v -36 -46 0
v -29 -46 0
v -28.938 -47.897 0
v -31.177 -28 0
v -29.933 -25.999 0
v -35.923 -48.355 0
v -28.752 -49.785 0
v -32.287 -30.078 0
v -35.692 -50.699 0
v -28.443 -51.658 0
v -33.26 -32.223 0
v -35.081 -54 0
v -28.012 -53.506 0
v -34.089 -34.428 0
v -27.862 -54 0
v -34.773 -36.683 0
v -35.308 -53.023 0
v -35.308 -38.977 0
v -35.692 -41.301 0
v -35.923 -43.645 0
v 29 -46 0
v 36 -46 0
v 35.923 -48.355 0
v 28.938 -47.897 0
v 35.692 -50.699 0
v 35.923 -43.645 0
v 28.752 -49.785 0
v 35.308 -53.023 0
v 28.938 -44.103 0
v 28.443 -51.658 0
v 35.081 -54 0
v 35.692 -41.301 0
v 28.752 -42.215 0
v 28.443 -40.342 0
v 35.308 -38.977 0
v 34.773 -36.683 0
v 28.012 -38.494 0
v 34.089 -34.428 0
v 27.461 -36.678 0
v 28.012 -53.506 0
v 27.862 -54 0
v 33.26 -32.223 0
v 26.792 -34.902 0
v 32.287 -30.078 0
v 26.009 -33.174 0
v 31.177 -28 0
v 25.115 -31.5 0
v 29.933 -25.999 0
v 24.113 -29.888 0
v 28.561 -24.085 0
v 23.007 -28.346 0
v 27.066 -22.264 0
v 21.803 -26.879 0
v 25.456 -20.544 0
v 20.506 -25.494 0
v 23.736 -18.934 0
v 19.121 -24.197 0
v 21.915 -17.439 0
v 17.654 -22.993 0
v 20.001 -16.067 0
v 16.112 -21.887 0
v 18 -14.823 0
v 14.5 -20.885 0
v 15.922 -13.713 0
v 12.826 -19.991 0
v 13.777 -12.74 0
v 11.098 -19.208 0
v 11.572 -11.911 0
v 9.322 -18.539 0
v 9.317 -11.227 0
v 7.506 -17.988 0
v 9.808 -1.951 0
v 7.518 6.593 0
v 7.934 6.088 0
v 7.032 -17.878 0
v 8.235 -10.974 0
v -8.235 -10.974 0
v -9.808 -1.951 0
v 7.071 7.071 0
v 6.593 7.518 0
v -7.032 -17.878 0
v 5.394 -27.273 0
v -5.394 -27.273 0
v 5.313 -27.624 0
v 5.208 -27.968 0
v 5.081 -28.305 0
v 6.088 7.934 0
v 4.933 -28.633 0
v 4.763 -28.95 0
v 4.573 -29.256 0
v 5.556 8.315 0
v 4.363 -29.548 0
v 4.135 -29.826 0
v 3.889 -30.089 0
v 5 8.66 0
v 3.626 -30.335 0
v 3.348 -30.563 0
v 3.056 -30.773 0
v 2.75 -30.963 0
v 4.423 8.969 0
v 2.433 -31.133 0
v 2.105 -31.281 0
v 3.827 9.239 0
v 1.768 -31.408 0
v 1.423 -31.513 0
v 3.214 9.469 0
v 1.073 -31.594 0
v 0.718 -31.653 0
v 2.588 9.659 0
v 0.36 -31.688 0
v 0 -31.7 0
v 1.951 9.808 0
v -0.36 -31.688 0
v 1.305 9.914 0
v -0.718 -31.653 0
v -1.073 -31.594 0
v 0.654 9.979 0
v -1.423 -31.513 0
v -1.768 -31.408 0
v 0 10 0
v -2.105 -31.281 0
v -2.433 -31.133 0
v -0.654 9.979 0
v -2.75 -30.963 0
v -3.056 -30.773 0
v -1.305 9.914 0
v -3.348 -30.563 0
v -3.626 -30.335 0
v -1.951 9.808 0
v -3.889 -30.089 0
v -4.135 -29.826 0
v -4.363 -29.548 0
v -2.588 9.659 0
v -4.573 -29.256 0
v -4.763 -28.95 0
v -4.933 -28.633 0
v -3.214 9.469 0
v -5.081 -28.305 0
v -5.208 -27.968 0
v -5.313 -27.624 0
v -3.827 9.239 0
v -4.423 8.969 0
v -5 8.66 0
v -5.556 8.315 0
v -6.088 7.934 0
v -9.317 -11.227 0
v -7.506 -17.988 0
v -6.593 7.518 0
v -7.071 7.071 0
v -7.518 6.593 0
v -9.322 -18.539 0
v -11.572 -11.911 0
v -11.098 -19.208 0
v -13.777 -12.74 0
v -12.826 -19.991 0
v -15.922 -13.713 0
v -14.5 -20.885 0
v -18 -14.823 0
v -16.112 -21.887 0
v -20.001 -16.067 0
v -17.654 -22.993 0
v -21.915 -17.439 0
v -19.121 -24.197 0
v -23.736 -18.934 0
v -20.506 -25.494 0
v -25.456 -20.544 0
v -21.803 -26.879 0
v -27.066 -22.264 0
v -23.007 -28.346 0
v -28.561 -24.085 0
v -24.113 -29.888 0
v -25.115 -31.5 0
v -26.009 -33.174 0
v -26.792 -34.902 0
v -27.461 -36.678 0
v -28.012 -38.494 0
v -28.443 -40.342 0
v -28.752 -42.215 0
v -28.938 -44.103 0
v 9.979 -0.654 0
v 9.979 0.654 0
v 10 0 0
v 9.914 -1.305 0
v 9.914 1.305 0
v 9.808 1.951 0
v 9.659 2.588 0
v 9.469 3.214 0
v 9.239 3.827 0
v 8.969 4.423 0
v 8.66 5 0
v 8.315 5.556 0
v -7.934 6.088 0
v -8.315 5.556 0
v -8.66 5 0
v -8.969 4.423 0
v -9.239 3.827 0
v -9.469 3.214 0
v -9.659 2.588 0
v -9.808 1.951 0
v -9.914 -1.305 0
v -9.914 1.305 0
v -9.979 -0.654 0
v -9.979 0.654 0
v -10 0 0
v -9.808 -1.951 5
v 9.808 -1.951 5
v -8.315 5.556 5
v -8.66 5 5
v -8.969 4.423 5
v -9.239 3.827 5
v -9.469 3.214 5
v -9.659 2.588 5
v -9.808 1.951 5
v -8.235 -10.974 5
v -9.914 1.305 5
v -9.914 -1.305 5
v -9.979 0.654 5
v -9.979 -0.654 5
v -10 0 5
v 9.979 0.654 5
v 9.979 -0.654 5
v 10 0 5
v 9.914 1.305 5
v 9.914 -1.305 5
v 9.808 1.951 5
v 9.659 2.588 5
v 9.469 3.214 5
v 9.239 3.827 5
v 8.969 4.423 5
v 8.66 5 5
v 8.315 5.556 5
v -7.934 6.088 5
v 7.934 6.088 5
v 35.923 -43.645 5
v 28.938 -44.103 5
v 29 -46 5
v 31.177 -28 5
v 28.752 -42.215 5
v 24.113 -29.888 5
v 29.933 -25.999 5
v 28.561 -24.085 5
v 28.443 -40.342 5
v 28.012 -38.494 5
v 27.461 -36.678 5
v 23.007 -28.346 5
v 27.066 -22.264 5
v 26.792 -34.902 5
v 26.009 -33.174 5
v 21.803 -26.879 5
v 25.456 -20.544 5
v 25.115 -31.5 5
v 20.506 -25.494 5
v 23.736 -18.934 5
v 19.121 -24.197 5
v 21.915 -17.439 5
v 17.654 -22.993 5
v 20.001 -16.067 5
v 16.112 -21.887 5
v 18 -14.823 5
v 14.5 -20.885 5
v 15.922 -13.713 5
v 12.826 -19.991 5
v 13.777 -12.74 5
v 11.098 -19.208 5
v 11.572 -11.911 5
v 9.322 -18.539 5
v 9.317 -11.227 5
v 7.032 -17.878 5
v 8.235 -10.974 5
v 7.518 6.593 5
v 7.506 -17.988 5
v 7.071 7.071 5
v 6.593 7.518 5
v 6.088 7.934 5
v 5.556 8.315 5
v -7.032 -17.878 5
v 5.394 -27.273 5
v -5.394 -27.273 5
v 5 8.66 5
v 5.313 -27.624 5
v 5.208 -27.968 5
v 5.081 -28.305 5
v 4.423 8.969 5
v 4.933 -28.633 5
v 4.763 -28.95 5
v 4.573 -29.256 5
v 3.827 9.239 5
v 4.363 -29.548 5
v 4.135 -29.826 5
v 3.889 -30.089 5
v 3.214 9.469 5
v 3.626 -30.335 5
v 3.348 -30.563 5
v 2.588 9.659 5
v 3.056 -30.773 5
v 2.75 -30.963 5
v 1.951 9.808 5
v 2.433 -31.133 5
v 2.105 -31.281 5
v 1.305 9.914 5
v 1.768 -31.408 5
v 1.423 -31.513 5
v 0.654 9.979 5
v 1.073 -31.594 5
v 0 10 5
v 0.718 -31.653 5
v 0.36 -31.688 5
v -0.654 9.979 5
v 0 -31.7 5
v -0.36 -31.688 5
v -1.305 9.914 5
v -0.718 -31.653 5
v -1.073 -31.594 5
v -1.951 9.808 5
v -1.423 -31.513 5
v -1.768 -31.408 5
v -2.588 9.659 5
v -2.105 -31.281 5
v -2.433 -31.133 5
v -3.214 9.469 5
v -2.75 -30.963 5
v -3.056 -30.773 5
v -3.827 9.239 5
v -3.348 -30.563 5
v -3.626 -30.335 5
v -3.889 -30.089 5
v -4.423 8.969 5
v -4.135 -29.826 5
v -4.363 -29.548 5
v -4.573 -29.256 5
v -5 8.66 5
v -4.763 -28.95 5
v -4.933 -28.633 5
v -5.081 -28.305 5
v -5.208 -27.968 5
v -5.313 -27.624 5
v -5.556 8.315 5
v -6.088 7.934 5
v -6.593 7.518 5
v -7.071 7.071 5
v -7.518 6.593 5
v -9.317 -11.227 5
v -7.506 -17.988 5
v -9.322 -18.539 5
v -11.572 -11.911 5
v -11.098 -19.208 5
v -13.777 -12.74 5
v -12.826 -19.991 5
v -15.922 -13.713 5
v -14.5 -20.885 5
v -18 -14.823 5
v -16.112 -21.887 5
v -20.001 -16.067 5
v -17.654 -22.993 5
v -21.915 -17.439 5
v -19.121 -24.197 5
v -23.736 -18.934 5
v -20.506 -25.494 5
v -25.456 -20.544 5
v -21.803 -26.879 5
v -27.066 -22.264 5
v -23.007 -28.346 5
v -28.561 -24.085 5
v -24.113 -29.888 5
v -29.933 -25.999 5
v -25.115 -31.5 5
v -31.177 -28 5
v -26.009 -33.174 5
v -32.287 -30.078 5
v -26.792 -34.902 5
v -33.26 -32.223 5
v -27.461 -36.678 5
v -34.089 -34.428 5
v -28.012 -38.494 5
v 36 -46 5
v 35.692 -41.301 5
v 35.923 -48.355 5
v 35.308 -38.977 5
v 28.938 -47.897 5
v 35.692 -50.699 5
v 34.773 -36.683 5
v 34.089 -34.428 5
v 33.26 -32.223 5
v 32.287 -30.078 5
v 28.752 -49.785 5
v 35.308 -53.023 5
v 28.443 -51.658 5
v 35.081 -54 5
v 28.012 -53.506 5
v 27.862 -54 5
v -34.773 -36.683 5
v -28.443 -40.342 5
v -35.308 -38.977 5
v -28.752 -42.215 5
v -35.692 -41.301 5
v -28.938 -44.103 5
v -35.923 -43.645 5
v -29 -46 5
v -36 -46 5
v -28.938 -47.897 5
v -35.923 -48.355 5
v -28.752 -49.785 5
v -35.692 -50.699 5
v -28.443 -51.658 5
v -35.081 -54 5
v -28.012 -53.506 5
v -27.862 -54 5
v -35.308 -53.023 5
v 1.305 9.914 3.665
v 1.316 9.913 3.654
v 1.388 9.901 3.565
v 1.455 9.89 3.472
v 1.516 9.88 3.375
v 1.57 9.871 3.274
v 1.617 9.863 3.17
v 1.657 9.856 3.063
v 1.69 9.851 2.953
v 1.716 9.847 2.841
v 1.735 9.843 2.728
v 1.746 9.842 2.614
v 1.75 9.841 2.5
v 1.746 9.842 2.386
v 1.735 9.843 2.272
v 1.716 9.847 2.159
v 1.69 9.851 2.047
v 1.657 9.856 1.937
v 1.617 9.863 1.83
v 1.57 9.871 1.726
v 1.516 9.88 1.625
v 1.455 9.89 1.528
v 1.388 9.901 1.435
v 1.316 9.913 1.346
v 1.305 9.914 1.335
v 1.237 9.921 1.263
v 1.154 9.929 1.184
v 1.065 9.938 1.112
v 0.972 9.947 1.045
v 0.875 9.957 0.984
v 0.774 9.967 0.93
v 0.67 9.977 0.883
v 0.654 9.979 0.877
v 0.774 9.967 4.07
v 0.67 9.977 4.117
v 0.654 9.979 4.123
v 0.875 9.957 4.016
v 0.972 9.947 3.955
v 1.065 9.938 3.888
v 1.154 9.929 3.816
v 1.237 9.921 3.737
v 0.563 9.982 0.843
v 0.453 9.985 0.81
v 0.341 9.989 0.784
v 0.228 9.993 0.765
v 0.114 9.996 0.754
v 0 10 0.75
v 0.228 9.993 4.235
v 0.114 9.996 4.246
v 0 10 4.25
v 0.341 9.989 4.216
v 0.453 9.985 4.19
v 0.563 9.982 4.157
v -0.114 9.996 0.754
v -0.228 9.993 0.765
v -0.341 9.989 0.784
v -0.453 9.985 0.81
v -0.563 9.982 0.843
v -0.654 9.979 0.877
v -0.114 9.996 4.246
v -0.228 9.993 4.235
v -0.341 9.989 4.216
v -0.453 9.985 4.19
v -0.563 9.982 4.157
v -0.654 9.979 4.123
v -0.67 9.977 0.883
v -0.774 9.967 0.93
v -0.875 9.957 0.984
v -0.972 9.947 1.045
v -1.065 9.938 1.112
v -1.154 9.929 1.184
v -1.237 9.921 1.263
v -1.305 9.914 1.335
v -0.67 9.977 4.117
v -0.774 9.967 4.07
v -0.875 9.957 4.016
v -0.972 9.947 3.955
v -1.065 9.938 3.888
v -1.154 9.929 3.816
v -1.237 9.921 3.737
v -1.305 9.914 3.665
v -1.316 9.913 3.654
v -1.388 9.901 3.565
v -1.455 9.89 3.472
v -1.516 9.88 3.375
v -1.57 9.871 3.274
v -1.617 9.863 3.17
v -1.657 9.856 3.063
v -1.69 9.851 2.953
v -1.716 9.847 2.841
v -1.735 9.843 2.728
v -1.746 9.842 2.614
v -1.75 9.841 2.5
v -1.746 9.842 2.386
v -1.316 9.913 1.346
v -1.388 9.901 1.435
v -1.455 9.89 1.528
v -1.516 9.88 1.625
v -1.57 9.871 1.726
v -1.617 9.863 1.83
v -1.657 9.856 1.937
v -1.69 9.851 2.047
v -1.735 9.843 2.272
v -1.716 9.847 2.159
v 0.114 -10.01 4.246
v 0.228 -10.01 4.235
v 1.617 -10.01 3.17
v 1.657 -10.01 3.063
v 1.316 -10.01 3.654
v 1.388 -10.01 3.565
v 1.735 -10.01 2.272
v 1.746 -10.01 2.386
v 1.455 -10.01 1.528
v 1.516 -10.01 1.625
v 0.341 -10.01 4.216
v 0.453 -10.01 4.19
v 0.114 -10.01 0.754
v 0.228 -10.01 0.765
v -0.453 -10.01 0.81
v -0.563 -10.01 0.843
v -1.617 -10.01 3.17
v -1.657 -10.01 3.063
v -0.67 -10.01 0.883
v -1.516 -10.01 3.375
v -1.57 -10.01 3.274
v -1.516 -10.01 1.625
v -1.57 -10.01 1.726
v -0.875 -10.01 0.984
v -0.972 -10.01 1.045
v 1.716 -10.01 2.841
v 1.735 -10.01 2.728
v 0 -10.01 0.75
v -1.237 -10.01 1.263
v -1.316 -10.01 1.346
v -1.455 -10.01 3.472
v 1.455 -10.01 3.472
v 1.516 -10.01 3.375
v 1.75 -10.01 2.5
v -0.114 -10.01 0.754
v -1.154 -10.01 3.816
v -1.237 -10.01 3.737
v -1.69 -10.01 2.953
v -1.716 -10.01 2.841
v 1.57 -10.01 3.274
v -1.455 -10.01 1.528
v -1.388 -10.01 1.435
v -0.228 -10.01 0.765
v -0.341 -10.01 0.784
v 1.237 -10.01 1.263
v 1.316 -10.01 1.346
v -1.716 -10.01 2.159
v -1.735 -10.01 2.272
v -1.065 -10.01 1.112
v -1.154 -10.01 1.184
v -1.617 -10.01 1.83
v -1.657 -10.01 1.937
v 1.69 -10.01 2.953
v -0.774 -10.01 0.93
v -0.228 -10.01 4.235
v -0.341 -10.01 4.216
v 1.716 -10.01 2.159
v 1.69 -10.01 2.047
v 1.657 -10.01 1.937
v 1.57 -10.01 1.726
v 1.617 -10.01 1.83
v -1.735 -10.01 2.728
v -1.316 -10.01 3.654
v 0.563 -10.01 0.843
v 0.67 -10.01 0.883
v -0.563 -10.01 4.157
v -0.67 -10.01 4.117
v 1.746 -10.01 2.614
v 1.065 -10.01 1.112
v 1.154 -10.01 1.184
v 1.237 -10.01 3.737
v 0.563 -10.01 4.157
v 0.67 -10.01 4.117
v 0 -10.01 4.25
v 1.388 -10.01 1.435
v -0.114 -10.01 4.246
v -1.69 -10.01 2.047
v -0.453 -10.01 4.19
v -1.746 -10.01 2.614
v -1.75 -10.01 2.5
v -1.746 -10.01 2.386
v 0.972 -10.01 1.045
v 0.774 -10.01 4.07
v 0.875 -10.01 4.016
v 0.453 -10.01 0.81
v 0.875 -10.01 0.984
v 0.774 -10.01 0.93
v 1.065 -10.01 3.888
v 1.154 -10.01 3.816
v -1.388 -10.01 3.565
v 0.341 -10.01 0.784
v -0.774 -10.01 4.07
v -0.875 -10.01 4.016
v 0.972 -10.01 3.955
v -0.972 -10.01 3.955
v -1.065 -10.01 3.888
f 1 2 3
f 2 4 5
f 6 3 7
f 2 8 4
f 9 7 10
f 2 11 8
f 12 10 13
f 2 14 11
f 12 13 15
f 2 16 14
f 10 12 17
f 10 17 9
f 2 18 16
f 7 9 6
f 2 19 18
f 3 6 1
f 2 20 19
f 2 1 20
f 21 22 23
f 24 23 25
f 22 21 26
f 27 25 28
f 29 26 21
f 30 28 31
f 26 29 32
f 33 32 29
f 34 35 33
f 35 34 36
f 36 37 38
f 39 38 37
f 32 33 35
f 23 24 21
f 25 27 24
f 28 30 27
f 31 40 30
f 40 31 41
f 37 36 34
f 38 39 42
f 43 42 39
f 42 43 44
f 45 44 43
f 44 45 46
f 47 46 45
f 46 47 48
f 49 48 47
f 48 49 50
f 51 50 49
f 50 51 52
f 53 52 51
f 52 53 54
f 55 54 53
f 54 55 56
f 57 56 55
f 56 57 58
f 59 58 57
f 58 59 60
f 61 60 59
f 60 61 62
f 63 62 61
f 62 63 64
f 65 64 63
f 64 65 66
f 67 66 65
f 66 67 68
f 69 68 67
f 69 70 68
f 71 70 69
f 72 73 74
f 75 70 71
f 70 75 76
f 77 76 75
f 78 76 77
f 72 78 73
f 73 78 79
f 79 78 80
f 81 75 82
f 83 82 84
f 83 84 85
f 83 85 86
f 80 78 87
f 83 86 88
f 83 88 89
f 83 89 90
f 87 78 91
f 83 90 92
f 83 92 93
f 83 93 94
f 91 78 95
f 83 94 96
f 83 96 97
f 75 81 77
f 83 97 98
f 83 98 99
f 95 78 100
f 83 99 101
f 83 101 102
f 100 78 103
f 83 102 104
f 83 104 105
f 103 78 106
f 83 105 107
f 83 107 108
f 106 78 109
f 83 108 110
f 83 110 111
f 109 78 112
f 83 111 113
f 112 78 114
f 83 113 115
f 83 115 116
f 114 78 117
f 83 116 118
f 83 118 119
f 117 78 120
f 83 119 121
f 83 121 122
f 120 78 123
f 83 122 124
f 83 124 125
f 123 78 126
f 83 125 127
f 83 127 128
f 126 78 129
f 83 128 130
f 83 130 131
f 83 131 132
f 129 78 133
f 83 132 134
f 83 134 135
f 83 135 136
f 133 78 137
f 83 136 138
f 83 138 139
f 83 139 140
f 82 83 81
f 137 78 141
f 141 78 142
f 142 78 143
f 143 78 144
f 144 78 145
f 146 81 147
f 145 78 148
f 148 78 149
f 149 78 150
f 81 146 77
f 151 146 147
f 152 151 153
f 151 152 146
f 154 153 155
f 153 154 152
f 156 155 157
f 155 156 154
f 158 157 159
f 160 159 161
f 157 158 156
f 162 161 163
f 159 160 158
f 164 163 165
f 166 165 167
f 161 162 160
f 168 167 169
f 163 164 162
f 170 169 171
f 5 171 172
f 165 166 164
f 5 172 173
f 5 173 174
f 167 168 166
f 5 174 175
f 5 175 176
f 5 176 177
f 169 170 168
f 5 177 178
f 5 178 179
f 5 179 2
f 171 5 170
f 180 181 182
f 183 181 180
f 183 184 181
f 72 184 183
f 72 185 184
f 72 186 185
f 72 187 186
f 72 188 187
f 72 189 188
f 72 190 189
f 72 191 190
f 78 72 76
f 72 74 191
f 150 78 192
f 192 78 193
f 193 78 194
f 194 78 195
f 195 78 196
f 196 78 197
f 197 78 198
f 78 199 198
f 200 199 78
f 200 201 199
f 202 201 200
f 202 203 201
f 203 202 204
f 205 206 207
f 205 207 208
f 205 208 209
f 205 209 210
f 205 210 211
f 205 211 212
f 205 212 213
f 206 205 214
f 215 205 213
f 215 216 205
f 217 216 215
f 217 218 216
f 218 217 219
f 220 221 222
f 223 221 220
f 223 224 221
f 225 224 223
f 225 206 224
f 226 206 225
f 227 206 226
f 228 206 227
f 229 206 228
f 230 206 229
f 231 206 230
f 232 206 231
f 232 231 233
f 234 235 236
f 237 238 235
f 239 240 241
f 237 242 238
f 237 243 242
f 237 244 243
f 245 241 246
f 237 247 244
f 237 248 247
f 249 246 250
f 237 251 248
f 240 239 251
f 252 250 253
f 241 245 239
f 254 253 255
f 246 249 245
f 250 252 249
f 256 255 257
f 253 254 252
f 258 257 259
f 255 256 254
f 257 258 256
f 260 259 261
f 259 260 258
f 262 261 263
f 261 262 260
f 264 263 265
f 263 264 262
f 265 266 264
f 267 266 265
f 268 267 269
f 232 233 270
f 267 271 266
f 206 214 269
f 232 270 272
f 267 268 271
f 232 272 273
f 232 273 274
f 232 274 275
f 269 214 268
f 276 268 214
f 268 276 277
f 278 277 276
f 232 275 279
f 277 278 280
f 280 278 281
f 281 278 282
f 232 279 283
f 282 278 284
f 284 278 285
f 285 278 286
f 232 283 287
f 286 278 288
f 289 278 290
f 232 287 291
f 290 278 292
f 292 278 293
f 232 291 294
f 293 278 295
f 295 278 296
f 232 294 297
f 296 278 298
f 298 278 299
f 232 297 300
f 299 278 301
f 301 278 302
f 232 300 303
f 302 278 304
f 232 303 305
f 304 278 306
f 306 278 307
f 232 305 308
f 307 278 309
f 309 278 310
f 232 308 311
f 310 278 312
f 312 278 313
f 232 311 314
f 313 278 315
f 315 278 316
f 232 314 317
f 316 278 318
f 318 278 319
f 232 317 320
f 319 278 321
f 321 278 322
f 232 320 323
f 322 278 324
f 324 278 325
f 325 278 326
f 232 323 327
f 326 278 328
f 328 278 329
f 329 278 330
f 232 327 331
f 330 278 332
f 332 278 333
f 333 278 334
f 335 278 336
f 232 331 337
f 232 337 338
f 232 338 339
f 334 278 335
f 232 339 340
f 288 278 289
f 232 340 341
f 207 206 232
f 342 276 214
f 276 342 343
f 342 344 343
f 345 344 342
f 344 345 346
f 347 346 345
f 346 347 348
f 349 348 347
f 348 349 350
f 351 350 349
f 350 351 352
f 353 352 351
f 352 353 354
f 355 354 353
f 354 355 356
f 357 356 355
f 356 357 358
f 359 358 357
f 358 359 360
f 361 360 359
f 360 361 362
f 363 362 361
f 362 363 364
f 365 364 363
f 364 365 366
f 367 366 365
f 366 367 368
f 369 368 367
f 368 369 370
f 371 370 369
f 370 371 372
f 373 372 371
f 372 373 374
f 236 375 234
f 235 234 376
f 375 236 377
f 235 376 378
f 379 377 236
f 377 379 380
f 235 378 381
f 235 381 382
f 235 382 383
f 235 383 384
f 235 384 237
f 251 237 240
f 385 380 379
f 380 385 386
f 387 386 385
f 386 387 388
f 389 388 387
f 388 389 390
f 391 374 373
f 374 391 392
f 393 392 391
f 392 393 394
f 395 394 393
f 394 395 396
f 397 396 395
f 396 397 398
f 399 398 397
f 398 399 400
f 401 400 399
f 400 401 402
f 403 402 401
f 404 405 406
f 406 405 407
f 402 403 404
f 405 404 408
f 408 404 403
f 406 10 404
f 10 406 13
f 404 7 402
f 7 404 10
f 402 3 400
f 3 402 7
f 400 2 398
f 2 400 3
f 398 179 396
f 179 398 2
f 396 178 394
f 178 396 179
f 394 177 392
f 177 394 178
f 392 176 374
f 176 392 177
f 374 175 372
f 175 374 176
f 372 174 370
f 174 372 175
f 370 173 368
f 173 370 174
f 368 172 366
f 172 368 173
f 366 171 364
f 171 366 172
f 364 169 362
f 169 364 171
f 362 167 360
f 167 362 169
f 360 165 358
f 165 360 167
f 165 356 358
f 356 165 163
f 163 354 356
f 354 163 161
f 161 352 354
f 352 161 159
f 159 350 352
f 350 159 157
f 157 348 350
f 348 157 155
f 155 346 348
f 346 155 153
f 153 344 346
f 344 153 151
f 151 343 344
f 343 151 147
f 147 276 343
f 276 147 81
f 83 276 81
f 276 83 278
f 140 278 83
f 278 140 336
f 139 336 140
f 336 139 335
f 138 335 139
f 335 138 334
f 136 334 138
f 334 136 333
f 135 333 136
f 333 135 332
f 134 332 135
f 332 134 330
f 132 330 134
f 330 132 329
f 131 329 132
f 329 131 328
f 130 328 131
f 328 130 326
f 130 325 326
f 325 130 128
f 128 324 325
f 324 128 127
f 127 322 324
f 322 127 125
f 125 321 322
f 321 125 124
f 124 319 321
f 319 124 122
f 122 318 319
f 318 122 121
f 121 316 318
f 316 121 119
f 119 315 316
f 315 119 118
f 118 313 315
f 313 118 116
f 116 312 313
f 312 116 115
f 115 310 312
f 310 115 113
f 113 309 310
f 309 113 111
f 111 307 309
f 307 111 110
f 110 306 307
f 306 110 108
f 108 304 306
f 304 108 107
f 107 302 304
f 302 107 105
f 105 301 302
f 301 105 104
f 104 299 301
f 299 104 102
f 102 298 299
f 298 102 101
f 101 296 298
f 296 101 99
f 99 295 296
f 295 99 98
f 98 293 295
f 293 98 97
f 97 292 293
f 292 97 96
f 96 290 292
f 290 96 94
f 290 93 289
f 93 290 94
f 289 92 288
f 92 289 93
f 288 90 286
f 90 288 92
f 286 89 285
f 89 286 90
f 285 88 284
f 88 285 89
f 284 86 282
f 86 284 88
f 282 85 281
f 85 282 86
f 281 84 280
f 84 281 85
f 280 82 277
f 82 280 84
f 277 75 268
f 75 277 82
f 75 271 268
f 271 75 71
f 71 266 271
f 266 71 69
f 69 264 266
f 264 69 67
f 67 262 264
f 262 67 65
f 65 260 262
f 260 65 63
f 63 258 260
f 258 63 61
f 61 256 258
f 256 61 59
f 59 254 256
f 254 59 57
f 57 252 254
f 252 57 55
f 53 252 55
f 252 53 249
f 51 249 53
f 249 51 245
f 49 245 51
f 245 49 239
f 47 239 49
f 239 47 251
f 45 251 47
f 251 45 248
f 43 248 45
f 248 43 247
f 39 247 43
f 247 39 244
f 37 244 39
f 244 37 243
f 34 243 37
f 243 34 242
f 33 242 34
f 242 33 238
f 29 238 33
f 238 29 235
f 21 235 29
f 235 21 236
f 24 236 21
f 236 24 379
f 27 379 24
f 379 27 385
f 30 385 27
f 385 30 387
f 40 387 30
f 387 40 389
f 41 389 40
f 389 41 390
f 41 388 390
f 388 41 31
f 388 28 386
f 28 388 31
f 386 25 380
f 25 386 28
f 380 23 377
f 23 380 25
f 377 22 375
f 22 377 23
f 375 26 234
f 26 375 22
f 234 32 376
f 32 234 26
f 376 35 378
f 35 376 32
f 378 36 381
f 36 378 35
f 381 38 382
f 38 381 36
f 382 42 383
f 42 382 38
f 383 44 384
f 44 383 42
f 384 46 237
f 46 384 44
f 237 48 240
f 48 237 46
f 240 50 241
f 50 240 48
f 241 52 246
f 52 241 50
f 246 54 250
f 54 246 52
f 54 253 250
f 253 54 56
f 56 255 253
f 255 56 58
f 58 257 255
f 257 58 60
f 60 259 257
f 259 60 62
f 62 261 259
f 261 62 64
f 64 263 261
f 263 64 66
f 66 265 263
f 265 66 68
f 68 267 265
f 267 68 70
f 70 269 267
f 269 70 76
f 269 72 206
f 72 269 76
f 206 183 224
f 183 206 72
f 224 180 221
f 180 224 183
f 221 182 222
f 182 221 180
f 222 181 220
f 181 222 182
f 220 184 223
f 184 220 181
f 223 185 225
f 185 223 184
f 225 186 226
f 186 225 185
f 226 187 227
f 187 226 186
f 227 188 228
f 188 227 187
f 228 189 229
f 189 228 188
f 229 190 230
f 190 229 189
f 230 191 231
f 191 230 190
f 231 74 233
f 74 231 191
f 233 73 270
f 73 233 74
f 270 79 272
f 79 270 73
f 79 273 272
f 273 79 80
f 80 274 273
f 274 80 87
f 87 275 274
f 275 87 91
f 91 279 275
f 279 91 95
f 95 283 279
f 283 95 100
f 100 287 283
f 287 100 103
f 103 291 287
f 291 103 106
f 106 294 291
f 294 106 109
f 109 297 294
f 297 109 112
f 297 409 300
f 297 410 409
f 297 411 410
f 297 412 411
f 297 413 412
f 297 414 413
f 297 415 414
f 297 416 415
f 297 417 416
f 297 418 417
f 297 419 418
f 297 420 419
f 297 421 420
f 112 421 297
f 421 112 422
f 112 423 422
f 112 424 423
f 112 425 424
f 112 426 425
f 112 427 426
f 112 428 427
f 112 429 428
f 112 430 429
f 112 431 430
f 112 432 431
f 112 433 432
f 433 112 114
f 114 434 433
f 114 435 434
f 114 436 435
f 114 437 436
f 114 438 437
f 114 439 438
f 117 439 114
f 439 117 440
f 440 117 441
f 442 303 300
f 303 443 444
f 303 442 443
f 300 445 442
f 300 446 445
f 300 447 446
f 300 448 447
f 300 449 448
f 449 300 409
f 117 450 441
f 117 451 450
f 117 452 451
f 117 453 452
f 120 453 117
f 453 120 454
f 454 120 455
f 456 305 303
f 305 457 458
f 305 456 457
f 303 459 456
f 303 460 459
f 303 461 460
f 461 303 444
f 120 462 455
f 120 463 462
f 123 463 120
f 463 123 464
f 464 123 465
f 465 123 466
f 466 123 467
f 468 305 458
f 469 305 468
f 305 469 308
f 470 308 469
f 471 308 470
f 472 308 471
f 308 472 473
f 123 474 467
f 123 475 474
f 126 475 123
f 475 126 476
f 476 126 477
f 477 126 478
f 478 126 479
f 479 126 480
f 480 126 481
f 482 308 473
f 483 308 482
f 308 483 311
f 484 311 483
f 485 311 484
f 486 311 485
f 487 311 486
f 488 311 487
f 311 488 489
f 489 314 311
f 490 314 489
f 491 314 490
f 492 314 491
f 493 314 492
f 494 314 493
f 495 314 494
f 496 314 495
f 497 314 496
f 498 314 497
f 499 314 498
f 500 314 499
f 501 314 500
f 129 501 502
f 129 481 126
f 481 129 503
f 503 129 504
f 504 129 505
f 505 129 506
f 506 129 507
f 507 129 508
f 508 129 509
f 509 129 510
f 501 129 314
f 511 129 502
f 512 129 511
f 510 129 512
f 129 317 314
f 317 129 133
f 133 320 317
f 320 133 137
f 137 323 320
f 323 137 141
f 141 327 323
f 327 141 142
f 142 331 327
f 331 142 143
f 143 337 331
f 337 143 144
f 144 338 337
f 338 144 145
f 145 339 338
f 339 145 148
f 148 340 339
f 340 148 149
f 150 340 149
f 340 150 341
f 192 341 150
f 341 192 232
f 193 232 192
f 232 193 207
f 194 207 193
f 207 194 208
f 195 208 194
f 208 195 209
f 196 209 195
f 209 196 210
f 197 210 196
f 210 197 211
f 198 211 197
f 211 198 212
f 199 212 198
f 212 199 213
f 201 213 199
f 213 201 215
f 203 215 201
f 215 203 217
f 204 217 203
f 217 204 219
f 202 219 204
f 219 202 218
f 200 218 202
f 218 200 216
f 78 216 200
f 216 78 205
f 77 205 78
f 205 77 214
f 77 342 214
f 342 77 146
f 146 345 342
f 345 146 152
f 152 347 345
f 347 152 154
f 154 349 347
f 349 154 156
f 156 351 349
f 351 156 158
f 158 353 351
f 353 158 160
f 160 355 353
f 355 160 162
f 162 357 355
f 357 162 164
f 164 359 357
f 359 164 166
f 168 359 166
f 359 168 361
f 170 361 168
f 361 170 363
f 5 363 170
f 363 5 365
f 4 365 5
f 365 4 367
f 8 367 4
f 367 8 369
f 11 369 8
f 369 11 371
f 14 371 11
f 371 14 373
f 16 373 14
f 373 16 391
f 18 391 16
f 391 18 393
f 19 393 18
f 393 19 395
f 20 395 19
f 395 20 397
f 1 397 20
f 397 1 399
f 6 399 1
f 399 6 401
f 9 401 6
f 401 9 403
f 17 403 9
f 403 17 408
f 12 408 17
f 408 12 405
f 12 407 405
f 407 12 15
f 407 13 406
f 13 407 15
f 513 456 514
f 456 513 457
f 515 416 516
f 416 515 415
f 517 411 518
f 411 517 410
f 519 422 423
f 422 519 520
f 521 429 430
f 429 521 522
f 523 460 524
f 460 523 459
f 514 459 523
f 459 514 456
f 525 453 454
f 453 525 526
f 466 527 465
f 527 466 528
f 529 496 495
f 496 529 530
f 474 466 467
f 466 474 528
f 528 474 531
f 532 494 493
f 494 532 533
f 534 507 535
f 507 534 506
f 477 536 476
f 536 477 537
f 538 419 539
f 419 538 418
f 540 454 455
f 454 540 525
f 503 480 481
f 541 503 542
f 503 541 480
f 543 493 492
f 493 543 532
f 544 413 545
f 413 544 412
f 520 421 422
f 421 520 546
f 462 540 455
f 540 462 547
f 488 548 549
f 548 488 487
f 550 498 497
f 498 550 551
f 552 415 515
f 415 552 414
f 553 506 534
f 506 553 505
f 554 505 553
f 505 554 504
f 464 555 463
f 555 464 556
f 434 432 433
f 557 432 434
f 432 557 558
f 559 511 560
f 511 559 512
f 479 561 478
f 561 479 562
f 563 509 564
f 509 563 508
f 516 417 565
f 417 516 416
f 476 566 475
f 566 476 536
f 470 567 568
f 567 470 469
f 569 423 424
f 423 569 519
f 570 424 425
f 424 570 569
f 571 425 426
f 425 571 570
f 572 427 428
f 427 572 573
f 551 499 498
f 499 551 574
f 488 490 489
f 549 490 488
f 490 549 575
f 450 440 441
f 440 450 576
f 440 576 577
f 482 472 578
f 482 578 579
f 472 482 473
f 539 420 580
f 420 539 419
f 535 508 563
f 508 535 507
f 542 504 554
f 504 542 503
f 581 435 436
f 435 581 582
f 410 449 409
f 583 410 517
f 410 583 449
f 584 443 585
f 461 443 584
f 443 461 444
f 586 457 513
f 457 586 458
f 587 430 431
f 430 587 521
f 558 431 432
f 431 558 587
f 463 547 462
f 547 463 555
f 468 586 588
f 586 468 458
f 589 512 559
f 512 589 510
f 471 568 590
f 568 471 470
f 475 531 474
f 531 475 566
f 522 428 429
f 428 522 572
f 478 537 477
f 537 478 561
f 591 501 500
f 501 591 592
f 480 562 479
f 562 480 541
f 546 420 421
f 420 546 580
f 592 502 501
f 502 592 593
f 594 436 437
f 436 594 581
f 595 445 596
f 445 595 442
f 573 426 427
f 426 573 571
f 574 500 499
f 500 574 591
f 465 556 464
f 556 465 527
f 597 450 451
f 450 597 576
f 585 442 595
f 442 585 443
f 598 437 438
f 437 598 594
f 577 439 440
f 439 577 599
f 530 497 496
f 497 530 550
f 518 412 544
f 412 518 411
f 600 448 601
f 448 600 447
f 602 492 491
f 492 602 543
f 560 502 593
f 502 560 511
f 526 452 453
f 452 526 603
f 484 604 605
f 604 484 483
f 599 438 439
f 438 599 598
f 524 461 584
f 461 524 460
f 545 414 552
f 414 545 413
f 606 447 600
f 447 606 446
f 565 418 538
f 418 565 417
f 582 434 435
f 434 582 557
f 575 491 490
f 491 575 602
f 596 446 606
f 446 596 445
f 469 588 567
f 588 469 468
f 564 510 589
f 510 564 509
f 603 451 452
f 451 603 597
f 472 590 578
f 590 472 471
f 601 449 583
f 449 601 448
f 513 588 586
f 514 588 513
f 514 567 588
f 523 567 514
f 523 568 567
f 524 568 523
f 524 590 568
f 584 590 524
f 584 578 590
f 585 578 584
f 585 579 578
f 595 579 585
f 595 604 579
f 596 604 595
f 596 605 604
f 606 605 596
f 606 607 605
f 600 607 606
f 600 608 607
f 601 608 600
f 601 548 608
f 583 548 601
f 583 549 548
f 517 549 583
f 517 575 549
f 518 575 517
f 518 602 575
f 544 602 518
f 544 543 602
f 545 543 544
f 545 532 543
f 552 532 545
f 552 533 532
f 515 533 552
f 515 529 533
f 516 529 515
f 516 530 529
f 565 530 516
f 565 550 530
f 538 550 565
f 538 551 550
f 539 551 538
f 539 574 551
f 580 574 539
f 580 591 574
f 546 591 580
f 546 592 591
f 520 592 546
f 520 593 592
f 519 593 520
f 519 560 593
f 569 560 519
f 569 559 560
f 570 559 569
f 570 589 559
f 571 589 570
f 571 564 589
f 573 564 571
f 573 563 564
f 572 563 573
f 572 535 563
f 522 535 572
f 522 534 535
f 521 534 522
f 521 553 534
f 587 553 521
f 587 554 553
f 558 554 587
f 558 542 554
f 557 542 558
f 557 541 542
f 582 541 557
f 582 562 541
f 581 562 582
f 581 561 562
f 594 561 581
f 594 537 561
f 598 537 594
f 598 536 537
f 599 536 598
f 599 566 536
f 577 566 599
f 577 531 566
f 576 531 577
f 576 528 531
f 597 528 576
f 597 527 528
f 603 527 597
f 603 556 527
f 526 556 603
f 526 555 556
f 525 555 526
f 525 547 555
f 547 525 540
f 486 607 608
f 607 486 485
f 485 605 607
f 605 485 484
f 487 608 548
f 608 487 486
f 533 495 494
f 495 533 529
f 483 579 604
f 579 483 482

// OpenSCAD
// Parametric ceiling hook — print on side.
//
// PRINT ORIENTATION
//   Lay flat: profile in XY, hook_width_mm in Z (print height).
//   Layer lines wrap around the C-arc perimeter — strongest for bending/tension.
//
// INSTALLATION  (switch render_mode to "installed" to visualise)
//   1. rotate([90,0,0]) stands the profile vertical; C hangs straight down.
//   2. Press the flat top face of the mount pad (max-Y in print = max-Z
//      installed) flush against the ceiling joist face.
//   3. Drive the drywall screw upward through the clearance hole into the joist.
//      The bugle/cone head bears on the 5 mm pad face and self-embeds into PLA
//      under drive torque — do not overtighten.  Pre-drill a pilot hole.
//   4. Lift the item up into the open-bottom C-cradle; gravity retains it.
//
// FORCE ALIGNMENT
//   Screw centreline and item centre are both at X = 0 in both orientations.
//   The hung load creates no bending moment on the screw.
//
// SCREW NOTE
//   The screw runs through the 5 mm hook thickness (print-Z = installed-Y).
//   A standard drywall screw shank (≤ hook_width_mm) fits; the head overhangs
//   the narrow edge and bears on the wider pad face — this is intentional.

$fn = 96;
eps = 0.01;

render_mode = "print"; // "print" or "installed"

// ── Core sizing ──────────────────────────────────────────────────────────────
hook_width_mm          = 5;   // extruded depth (print Z = installed front-to-back)
thing_diameter_mm      = 55;  // outside diameter of the object to hang
fit_clearance_mm       = 3;   // extra air-gap inside the arc
hook_wall_mm           = 7;   // radial wall thickness of the ring

// Distance below the ring centre at which the C mouth opens.
//   0  → 180 ° semicircle (widest entry, shallowest cradle).
//   ↑  → deeper wrap, narrower entry gap.
//   max ≈ sqrt(inner_r² − (thing_dia/2)²)  so gap ≥ thing_diameter.
mouth_below_centre_mm  = 8;   // default: ≈ 55.7 mm gap, ≈ 212 ° wrap

// ── Mount pad & fastener ─────────────────────────────────────────────────────
mount_pad_radius_mm    = 10;  // radius of the circular ceiling plate
// Clearance hole only — no countersink (head is wider than 5 mm hook edge).
// Use a #6 drywall screw (≈ 3.5 mm shank).  Larger screws risk splitting
// the thin PLA wall around the hole.
screw_shank_dia_mm     = 3.5;

// ── Web ──────────────────────────────────────────────────────────────────────
web_thickness_mm       = 11;  // width of the neck connecting pad to ring

// ── Derived ──────────────────────────────────────────────────────────────────
clear_diameter_mm  = thing_diameter_mm + fit_clearance_mm;
inner_radius_mm    = clear_diameter_mm / 2;
outer_radius_mm    = inner_radius_mm + hook_wall_mm;
// Ring sits below the mount pad, outer top tangent to the pad bottom (Y = −pad_r).
ring_center_y_mm   = -(mount_pad_radius_mm + outer_radius_mm);
web_anchor_y_mm    = ring_center_y_mm + outer_radius_mm * 0.55;

mouth_gap_mm = 2 * sqrt(max(0,
    inner_radius_mm * inner_radius_mm
    - mouth_below_centre_mm * mouth_below_centre_mm));

// ── Assertions ───────────────────────────────────────────────────────────────
assert(hook_width_mm > 0);
assert(thing_diameter_mm > 0);
assert(fit_clearance_mm >= 0);
assert(hook_wall_mm > 0);
assert(mount_pad_radius_mm > 0);
assert(web_thickness_mm > 0);
assert(screw_shank_dia_mm > 0);
assert(screw_shank_dia_mm < hook_width_mm,
    "screw_shank_dia_mm must be less than hook_width_mm.");
assert(mouth_below_centre_mm >= 0 && mouth_below_centre_mm < inner_radius_mm,
    "mouth_below_centre_mm must be in [0, inner_radius_mm).");
assert(mouth_gap_mm >= thing_diameter_mm,
    str("Mouth gap ", mouth_gap_mm,
        " mm < thing_diameter_mm. Reduce mouth_below_centre_mm."));

echo(str("Clear inside diameter: ", clear_diameter_mm, " mm"));
echo(str("Outer diameter:        ", 2 * outer_radius_mm, " mm"));
echo(str("Mouth gap (opening):   ", mouth_gap_mm,
         " mm  (need >= ", thing_diameter_mm, " mm ✓)"));
echo(str("Arc wrap:              ~",
         180 + 2 * asin(mouth_below_centre_mm / inner_radius_mm), " °"));
echo(str("Screw hole: along Y (print) = vertical into ceiling when installed,",
         " Ø", screw_shank_dia_mm, " mm clearance hole."));

// ── 2-D profile ───────────────────────────────────────────────────────────────
module ring_2d() {
    difference() {
        circle(r = outer_radius_mm);
        circle(r = inner_radius_mm);
    }
}

module c_hook_2d() {
    // Downward-opening C: ring centred at ring_center_y_mm with its bottom
    // cut away.  Item enters from below; gravity keeps it seated at the top
    // of the inner arc.
    translate([0, ring_center_y_mm])
        difference() {
            ring_2d();
            // Remove everything below (-mouth_below_centre_mm) in ring-local Y.
            translate([-(outer_radius_mm + eps), -(outer_radius_mm + eps)])
                square([2 * (outer_radius_mm + eps),
                        outer_radius_mm + eps - mouth_below_centre_mm]);
        }
}

module hook_profile_2d() {
    union() {
        c_hook_2d();

        // Circular ceiling pad.  Its +Y face (max-Y) contacts the ceiling.
        circle(r = mount_pad_radius_mm);

        // Tapered web neck bridging pad to ring body.
        hull() {
            circle(r = mount_pad_radius_mm);
            translate([0, web_anchor_y_mm])
                circle(r = web_thickness_mm / 2);
        }
    }
}

// ── 3-D solid ─────────────────────────────────────────────────────────────────
module hook_body() {
    linear_extrude(height = hook_width_mm, convexity = 10)
        hook_profile_2d();
}

// Screw clearance hole along +Y at (X = 0, Z = hook_width / 2).
// After rotate([90,0,0]) for installation, +Y maps to +Z → straight into ceiling.
module screw_cut() {
    translate([0, -(mount_pad_radius_mm + eps), hook_width_mm / 2])
        rotate([-90, 0, 0])
            cylinder(d = screw_shank_dia_mm,
                     h = 2 * mount_pad_radius_mm + 2 * eps);
}

module printable_hook() {
    difference() {
        hook_body();
        screw_cut();
    }
}

// ── Render modes ──────────────────────────────────────────────────────────────
module installed_hook() {
    // rotate([90,0,0]): old +Y → new +Z (up toward ceiling),
    //                   old +Z → new -Y (hook depth, front-to-back).
    // Result: pad top face against ceiling, C hangs straight down.
    rotate([90, 0, 0])
        printable_hook();
}

if (render_mode == "print")
    printable_hook();
else if (render_mode == "installed")
    installed_hook();
else
    assert(false, "render_mode must be \"print\" or \"installed\".");
